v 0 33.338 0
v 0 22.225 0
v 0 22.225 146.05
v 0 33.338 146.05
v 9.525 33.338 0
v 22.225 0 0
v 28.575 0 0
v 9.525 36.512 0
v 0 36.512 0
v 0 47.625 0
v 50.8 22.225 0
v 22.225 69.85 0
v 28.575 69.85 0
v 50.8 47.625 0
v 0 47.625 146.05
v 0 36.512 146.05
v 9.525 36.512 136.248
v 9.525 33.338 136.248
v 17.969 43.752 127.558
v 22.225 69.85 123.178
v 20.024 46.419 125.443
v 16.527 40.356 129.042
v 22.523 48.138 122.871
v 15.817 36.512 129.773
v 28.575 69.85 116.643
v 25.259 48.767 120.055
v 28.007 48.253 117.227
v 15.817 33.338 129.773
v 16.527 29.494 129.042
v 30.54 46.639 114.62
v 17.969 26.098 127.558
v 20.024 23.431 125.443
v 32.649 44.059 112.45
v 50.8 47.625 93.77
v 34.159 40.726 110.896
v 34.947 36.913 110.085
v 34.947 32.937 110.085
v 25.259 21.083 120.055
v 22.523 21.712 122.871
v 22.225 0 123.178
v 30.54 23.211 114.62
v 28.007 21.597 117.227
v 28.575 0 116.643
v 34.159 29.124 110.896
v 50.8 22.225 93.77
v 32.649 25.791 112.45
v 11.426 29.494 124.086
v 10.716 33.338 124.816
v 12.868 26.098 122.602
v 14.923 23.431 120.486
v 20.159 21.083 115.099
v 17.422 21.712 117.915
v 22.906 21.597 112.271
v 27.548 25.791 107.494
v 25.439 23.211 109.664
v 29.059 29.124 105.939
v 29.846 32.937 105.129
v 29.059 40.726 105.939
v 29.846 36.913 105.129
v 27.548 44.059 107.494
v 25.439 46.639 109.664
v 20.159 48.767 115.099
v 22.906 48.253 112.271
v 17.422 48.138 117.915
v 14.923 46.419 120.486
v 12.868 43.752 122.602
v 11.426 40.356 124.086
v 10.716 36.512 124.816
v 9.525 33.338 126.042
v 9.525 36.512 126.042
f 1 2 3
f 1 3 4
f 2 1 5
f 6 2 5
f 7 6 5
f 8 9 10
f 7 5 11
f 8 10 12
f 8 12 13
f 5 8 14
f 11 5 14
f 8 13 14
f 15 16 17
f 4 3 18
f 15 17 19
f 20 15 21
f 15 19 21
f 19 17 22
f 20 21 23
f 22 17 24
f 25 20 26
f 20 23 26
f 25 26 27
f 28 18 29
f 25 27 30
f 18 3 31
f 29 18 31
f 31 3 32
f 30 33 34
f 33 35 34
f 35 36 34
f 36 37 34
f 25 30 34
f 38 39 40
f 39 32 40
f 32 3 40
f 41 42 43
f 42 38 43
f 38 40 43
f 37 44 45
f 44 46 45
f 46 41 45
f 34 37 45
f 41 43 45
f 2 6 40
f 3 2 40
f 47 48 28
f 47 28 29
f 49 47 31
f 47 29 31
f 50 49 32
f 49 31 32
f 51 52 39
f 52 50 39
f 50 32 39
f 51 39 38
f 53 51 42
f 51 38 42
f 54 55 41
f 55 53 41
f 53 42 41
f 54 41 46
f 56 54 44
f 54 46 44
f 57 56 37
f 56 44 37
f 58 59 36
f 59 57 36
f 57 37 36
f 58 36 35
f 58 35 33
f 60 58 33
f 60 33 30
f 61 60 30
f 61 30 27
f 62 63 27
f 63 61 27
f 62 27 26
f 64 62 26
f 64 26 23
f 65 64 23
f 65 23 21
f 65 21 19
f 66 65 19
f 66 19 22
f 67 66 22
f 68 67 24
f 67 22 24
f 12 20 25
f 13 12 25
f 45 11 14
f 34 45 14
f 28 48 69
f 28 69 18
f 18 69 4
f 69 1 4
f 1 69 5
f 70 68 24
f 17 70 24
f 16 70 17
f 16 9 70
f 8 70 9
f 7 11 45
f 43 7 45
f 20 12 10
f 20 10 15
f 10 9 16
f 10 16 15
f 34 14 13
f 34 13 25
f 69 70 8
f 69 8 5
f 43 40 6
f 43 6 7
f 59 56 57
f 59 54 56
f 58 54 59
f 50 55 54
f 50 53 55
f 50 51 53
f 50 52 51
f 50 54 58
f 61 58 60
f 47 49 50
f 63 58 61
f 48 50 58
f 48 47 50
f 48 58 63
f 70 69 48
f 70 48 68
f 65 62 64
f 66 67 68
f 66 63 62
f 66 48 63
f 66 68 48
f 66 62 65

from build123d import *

# Parameters (mm, degrees)
F0_W      = 50.8
F0_H      = 69.85
F1_DEPTH  = 146.05
F3_DEPTH  = 69.851
F4_R      = 13.843
F5_DEPTH  = 7.112
F6_SIZE   = 22.225
F7_W      = 3.175
F7_H      = 146.05
F8_DEPTH  = 9.525
F10_DEPTH = 7.112


with BuildPart() as f1:
    # F0 (on Top) → F1 (new body)
    with BuildSketch(Plane.XY):
        with Locations((25.4, 34.925)):
            Rectangle(F0_W, F0_H)
    extrude(amount=F1_DEPTH)

    # F2 (on face) → F3 (cut, through all)
    with BuildSketch(Plane.XZ):
        Polygon((50.8, 146.05), (0, 146.05), (50.8, 93.7700346112), align=None)
    extrude(amount=-F3_DEPTH, mode=Mode.SUBTRACT)

    # F4 (on face) → F5 (cut)
    with BuildSketch(Plane(origin=(72.9948999902, 0, 70.9285266723), x_dir=(0, 1, 0), z_dir=(0.7171851159, 0, 0.6968827086))):
        with Locations((34.925, 68.2968588571)):
            Circle(F4_R)
    extrude(amount=-F5_DEPTH, mode=Mode.SUBTRACT)

    # F6
    f6_edges = [f1.edges().sort_by_distance(p)[0] for p in [
        (50.8, 0, 46.885017),
        (50.8, 69.85, 46.885017),
        (0, 69.85, 73.025),
        (0, 0, 73.025),
    ]]
    chamfer(f6_edges, length=F6_SIZE)

    # F7 (on face) → F8 (cut)
    with BuildSketch(Plane(origin=(0, 0, 0), x_dir=(0, -1, 0), z_dir=(-1, 0, 0))):
        with Locations((-34.925, 73.025)):
            Rectangle(F7_W, F7_H)
    extrude(amount=-F8_DEPTH, mode=Mode.SUBTRACT)

    # F9 (on face) → F10 (cut)
    with BuildSketch(Plane(origin=(72.9948999902, 0, 70.9285266723), x_dir=(0, 1, 0), z_dir=(0.7171851159, 0, 0.6968827086))):
        with BuildLine():
            Line((36.5125, 91.0768759299), (33.3375, 91.0768759299))
            Line((33.3375, 91.0768759299), (33.3375, 82.048531219))
            ThreePointArc((33.3375, 82.048531219), (34.925, 82.1398588571), (36.5125, 82.048531219))
            Line((36.5125, 82.048531219), (36.5125, 91.0768759299))
        make_face()
    extrude(amount=-F10_DEPTH, mode=Mode.SUBTRACT)


solid = f1.part
